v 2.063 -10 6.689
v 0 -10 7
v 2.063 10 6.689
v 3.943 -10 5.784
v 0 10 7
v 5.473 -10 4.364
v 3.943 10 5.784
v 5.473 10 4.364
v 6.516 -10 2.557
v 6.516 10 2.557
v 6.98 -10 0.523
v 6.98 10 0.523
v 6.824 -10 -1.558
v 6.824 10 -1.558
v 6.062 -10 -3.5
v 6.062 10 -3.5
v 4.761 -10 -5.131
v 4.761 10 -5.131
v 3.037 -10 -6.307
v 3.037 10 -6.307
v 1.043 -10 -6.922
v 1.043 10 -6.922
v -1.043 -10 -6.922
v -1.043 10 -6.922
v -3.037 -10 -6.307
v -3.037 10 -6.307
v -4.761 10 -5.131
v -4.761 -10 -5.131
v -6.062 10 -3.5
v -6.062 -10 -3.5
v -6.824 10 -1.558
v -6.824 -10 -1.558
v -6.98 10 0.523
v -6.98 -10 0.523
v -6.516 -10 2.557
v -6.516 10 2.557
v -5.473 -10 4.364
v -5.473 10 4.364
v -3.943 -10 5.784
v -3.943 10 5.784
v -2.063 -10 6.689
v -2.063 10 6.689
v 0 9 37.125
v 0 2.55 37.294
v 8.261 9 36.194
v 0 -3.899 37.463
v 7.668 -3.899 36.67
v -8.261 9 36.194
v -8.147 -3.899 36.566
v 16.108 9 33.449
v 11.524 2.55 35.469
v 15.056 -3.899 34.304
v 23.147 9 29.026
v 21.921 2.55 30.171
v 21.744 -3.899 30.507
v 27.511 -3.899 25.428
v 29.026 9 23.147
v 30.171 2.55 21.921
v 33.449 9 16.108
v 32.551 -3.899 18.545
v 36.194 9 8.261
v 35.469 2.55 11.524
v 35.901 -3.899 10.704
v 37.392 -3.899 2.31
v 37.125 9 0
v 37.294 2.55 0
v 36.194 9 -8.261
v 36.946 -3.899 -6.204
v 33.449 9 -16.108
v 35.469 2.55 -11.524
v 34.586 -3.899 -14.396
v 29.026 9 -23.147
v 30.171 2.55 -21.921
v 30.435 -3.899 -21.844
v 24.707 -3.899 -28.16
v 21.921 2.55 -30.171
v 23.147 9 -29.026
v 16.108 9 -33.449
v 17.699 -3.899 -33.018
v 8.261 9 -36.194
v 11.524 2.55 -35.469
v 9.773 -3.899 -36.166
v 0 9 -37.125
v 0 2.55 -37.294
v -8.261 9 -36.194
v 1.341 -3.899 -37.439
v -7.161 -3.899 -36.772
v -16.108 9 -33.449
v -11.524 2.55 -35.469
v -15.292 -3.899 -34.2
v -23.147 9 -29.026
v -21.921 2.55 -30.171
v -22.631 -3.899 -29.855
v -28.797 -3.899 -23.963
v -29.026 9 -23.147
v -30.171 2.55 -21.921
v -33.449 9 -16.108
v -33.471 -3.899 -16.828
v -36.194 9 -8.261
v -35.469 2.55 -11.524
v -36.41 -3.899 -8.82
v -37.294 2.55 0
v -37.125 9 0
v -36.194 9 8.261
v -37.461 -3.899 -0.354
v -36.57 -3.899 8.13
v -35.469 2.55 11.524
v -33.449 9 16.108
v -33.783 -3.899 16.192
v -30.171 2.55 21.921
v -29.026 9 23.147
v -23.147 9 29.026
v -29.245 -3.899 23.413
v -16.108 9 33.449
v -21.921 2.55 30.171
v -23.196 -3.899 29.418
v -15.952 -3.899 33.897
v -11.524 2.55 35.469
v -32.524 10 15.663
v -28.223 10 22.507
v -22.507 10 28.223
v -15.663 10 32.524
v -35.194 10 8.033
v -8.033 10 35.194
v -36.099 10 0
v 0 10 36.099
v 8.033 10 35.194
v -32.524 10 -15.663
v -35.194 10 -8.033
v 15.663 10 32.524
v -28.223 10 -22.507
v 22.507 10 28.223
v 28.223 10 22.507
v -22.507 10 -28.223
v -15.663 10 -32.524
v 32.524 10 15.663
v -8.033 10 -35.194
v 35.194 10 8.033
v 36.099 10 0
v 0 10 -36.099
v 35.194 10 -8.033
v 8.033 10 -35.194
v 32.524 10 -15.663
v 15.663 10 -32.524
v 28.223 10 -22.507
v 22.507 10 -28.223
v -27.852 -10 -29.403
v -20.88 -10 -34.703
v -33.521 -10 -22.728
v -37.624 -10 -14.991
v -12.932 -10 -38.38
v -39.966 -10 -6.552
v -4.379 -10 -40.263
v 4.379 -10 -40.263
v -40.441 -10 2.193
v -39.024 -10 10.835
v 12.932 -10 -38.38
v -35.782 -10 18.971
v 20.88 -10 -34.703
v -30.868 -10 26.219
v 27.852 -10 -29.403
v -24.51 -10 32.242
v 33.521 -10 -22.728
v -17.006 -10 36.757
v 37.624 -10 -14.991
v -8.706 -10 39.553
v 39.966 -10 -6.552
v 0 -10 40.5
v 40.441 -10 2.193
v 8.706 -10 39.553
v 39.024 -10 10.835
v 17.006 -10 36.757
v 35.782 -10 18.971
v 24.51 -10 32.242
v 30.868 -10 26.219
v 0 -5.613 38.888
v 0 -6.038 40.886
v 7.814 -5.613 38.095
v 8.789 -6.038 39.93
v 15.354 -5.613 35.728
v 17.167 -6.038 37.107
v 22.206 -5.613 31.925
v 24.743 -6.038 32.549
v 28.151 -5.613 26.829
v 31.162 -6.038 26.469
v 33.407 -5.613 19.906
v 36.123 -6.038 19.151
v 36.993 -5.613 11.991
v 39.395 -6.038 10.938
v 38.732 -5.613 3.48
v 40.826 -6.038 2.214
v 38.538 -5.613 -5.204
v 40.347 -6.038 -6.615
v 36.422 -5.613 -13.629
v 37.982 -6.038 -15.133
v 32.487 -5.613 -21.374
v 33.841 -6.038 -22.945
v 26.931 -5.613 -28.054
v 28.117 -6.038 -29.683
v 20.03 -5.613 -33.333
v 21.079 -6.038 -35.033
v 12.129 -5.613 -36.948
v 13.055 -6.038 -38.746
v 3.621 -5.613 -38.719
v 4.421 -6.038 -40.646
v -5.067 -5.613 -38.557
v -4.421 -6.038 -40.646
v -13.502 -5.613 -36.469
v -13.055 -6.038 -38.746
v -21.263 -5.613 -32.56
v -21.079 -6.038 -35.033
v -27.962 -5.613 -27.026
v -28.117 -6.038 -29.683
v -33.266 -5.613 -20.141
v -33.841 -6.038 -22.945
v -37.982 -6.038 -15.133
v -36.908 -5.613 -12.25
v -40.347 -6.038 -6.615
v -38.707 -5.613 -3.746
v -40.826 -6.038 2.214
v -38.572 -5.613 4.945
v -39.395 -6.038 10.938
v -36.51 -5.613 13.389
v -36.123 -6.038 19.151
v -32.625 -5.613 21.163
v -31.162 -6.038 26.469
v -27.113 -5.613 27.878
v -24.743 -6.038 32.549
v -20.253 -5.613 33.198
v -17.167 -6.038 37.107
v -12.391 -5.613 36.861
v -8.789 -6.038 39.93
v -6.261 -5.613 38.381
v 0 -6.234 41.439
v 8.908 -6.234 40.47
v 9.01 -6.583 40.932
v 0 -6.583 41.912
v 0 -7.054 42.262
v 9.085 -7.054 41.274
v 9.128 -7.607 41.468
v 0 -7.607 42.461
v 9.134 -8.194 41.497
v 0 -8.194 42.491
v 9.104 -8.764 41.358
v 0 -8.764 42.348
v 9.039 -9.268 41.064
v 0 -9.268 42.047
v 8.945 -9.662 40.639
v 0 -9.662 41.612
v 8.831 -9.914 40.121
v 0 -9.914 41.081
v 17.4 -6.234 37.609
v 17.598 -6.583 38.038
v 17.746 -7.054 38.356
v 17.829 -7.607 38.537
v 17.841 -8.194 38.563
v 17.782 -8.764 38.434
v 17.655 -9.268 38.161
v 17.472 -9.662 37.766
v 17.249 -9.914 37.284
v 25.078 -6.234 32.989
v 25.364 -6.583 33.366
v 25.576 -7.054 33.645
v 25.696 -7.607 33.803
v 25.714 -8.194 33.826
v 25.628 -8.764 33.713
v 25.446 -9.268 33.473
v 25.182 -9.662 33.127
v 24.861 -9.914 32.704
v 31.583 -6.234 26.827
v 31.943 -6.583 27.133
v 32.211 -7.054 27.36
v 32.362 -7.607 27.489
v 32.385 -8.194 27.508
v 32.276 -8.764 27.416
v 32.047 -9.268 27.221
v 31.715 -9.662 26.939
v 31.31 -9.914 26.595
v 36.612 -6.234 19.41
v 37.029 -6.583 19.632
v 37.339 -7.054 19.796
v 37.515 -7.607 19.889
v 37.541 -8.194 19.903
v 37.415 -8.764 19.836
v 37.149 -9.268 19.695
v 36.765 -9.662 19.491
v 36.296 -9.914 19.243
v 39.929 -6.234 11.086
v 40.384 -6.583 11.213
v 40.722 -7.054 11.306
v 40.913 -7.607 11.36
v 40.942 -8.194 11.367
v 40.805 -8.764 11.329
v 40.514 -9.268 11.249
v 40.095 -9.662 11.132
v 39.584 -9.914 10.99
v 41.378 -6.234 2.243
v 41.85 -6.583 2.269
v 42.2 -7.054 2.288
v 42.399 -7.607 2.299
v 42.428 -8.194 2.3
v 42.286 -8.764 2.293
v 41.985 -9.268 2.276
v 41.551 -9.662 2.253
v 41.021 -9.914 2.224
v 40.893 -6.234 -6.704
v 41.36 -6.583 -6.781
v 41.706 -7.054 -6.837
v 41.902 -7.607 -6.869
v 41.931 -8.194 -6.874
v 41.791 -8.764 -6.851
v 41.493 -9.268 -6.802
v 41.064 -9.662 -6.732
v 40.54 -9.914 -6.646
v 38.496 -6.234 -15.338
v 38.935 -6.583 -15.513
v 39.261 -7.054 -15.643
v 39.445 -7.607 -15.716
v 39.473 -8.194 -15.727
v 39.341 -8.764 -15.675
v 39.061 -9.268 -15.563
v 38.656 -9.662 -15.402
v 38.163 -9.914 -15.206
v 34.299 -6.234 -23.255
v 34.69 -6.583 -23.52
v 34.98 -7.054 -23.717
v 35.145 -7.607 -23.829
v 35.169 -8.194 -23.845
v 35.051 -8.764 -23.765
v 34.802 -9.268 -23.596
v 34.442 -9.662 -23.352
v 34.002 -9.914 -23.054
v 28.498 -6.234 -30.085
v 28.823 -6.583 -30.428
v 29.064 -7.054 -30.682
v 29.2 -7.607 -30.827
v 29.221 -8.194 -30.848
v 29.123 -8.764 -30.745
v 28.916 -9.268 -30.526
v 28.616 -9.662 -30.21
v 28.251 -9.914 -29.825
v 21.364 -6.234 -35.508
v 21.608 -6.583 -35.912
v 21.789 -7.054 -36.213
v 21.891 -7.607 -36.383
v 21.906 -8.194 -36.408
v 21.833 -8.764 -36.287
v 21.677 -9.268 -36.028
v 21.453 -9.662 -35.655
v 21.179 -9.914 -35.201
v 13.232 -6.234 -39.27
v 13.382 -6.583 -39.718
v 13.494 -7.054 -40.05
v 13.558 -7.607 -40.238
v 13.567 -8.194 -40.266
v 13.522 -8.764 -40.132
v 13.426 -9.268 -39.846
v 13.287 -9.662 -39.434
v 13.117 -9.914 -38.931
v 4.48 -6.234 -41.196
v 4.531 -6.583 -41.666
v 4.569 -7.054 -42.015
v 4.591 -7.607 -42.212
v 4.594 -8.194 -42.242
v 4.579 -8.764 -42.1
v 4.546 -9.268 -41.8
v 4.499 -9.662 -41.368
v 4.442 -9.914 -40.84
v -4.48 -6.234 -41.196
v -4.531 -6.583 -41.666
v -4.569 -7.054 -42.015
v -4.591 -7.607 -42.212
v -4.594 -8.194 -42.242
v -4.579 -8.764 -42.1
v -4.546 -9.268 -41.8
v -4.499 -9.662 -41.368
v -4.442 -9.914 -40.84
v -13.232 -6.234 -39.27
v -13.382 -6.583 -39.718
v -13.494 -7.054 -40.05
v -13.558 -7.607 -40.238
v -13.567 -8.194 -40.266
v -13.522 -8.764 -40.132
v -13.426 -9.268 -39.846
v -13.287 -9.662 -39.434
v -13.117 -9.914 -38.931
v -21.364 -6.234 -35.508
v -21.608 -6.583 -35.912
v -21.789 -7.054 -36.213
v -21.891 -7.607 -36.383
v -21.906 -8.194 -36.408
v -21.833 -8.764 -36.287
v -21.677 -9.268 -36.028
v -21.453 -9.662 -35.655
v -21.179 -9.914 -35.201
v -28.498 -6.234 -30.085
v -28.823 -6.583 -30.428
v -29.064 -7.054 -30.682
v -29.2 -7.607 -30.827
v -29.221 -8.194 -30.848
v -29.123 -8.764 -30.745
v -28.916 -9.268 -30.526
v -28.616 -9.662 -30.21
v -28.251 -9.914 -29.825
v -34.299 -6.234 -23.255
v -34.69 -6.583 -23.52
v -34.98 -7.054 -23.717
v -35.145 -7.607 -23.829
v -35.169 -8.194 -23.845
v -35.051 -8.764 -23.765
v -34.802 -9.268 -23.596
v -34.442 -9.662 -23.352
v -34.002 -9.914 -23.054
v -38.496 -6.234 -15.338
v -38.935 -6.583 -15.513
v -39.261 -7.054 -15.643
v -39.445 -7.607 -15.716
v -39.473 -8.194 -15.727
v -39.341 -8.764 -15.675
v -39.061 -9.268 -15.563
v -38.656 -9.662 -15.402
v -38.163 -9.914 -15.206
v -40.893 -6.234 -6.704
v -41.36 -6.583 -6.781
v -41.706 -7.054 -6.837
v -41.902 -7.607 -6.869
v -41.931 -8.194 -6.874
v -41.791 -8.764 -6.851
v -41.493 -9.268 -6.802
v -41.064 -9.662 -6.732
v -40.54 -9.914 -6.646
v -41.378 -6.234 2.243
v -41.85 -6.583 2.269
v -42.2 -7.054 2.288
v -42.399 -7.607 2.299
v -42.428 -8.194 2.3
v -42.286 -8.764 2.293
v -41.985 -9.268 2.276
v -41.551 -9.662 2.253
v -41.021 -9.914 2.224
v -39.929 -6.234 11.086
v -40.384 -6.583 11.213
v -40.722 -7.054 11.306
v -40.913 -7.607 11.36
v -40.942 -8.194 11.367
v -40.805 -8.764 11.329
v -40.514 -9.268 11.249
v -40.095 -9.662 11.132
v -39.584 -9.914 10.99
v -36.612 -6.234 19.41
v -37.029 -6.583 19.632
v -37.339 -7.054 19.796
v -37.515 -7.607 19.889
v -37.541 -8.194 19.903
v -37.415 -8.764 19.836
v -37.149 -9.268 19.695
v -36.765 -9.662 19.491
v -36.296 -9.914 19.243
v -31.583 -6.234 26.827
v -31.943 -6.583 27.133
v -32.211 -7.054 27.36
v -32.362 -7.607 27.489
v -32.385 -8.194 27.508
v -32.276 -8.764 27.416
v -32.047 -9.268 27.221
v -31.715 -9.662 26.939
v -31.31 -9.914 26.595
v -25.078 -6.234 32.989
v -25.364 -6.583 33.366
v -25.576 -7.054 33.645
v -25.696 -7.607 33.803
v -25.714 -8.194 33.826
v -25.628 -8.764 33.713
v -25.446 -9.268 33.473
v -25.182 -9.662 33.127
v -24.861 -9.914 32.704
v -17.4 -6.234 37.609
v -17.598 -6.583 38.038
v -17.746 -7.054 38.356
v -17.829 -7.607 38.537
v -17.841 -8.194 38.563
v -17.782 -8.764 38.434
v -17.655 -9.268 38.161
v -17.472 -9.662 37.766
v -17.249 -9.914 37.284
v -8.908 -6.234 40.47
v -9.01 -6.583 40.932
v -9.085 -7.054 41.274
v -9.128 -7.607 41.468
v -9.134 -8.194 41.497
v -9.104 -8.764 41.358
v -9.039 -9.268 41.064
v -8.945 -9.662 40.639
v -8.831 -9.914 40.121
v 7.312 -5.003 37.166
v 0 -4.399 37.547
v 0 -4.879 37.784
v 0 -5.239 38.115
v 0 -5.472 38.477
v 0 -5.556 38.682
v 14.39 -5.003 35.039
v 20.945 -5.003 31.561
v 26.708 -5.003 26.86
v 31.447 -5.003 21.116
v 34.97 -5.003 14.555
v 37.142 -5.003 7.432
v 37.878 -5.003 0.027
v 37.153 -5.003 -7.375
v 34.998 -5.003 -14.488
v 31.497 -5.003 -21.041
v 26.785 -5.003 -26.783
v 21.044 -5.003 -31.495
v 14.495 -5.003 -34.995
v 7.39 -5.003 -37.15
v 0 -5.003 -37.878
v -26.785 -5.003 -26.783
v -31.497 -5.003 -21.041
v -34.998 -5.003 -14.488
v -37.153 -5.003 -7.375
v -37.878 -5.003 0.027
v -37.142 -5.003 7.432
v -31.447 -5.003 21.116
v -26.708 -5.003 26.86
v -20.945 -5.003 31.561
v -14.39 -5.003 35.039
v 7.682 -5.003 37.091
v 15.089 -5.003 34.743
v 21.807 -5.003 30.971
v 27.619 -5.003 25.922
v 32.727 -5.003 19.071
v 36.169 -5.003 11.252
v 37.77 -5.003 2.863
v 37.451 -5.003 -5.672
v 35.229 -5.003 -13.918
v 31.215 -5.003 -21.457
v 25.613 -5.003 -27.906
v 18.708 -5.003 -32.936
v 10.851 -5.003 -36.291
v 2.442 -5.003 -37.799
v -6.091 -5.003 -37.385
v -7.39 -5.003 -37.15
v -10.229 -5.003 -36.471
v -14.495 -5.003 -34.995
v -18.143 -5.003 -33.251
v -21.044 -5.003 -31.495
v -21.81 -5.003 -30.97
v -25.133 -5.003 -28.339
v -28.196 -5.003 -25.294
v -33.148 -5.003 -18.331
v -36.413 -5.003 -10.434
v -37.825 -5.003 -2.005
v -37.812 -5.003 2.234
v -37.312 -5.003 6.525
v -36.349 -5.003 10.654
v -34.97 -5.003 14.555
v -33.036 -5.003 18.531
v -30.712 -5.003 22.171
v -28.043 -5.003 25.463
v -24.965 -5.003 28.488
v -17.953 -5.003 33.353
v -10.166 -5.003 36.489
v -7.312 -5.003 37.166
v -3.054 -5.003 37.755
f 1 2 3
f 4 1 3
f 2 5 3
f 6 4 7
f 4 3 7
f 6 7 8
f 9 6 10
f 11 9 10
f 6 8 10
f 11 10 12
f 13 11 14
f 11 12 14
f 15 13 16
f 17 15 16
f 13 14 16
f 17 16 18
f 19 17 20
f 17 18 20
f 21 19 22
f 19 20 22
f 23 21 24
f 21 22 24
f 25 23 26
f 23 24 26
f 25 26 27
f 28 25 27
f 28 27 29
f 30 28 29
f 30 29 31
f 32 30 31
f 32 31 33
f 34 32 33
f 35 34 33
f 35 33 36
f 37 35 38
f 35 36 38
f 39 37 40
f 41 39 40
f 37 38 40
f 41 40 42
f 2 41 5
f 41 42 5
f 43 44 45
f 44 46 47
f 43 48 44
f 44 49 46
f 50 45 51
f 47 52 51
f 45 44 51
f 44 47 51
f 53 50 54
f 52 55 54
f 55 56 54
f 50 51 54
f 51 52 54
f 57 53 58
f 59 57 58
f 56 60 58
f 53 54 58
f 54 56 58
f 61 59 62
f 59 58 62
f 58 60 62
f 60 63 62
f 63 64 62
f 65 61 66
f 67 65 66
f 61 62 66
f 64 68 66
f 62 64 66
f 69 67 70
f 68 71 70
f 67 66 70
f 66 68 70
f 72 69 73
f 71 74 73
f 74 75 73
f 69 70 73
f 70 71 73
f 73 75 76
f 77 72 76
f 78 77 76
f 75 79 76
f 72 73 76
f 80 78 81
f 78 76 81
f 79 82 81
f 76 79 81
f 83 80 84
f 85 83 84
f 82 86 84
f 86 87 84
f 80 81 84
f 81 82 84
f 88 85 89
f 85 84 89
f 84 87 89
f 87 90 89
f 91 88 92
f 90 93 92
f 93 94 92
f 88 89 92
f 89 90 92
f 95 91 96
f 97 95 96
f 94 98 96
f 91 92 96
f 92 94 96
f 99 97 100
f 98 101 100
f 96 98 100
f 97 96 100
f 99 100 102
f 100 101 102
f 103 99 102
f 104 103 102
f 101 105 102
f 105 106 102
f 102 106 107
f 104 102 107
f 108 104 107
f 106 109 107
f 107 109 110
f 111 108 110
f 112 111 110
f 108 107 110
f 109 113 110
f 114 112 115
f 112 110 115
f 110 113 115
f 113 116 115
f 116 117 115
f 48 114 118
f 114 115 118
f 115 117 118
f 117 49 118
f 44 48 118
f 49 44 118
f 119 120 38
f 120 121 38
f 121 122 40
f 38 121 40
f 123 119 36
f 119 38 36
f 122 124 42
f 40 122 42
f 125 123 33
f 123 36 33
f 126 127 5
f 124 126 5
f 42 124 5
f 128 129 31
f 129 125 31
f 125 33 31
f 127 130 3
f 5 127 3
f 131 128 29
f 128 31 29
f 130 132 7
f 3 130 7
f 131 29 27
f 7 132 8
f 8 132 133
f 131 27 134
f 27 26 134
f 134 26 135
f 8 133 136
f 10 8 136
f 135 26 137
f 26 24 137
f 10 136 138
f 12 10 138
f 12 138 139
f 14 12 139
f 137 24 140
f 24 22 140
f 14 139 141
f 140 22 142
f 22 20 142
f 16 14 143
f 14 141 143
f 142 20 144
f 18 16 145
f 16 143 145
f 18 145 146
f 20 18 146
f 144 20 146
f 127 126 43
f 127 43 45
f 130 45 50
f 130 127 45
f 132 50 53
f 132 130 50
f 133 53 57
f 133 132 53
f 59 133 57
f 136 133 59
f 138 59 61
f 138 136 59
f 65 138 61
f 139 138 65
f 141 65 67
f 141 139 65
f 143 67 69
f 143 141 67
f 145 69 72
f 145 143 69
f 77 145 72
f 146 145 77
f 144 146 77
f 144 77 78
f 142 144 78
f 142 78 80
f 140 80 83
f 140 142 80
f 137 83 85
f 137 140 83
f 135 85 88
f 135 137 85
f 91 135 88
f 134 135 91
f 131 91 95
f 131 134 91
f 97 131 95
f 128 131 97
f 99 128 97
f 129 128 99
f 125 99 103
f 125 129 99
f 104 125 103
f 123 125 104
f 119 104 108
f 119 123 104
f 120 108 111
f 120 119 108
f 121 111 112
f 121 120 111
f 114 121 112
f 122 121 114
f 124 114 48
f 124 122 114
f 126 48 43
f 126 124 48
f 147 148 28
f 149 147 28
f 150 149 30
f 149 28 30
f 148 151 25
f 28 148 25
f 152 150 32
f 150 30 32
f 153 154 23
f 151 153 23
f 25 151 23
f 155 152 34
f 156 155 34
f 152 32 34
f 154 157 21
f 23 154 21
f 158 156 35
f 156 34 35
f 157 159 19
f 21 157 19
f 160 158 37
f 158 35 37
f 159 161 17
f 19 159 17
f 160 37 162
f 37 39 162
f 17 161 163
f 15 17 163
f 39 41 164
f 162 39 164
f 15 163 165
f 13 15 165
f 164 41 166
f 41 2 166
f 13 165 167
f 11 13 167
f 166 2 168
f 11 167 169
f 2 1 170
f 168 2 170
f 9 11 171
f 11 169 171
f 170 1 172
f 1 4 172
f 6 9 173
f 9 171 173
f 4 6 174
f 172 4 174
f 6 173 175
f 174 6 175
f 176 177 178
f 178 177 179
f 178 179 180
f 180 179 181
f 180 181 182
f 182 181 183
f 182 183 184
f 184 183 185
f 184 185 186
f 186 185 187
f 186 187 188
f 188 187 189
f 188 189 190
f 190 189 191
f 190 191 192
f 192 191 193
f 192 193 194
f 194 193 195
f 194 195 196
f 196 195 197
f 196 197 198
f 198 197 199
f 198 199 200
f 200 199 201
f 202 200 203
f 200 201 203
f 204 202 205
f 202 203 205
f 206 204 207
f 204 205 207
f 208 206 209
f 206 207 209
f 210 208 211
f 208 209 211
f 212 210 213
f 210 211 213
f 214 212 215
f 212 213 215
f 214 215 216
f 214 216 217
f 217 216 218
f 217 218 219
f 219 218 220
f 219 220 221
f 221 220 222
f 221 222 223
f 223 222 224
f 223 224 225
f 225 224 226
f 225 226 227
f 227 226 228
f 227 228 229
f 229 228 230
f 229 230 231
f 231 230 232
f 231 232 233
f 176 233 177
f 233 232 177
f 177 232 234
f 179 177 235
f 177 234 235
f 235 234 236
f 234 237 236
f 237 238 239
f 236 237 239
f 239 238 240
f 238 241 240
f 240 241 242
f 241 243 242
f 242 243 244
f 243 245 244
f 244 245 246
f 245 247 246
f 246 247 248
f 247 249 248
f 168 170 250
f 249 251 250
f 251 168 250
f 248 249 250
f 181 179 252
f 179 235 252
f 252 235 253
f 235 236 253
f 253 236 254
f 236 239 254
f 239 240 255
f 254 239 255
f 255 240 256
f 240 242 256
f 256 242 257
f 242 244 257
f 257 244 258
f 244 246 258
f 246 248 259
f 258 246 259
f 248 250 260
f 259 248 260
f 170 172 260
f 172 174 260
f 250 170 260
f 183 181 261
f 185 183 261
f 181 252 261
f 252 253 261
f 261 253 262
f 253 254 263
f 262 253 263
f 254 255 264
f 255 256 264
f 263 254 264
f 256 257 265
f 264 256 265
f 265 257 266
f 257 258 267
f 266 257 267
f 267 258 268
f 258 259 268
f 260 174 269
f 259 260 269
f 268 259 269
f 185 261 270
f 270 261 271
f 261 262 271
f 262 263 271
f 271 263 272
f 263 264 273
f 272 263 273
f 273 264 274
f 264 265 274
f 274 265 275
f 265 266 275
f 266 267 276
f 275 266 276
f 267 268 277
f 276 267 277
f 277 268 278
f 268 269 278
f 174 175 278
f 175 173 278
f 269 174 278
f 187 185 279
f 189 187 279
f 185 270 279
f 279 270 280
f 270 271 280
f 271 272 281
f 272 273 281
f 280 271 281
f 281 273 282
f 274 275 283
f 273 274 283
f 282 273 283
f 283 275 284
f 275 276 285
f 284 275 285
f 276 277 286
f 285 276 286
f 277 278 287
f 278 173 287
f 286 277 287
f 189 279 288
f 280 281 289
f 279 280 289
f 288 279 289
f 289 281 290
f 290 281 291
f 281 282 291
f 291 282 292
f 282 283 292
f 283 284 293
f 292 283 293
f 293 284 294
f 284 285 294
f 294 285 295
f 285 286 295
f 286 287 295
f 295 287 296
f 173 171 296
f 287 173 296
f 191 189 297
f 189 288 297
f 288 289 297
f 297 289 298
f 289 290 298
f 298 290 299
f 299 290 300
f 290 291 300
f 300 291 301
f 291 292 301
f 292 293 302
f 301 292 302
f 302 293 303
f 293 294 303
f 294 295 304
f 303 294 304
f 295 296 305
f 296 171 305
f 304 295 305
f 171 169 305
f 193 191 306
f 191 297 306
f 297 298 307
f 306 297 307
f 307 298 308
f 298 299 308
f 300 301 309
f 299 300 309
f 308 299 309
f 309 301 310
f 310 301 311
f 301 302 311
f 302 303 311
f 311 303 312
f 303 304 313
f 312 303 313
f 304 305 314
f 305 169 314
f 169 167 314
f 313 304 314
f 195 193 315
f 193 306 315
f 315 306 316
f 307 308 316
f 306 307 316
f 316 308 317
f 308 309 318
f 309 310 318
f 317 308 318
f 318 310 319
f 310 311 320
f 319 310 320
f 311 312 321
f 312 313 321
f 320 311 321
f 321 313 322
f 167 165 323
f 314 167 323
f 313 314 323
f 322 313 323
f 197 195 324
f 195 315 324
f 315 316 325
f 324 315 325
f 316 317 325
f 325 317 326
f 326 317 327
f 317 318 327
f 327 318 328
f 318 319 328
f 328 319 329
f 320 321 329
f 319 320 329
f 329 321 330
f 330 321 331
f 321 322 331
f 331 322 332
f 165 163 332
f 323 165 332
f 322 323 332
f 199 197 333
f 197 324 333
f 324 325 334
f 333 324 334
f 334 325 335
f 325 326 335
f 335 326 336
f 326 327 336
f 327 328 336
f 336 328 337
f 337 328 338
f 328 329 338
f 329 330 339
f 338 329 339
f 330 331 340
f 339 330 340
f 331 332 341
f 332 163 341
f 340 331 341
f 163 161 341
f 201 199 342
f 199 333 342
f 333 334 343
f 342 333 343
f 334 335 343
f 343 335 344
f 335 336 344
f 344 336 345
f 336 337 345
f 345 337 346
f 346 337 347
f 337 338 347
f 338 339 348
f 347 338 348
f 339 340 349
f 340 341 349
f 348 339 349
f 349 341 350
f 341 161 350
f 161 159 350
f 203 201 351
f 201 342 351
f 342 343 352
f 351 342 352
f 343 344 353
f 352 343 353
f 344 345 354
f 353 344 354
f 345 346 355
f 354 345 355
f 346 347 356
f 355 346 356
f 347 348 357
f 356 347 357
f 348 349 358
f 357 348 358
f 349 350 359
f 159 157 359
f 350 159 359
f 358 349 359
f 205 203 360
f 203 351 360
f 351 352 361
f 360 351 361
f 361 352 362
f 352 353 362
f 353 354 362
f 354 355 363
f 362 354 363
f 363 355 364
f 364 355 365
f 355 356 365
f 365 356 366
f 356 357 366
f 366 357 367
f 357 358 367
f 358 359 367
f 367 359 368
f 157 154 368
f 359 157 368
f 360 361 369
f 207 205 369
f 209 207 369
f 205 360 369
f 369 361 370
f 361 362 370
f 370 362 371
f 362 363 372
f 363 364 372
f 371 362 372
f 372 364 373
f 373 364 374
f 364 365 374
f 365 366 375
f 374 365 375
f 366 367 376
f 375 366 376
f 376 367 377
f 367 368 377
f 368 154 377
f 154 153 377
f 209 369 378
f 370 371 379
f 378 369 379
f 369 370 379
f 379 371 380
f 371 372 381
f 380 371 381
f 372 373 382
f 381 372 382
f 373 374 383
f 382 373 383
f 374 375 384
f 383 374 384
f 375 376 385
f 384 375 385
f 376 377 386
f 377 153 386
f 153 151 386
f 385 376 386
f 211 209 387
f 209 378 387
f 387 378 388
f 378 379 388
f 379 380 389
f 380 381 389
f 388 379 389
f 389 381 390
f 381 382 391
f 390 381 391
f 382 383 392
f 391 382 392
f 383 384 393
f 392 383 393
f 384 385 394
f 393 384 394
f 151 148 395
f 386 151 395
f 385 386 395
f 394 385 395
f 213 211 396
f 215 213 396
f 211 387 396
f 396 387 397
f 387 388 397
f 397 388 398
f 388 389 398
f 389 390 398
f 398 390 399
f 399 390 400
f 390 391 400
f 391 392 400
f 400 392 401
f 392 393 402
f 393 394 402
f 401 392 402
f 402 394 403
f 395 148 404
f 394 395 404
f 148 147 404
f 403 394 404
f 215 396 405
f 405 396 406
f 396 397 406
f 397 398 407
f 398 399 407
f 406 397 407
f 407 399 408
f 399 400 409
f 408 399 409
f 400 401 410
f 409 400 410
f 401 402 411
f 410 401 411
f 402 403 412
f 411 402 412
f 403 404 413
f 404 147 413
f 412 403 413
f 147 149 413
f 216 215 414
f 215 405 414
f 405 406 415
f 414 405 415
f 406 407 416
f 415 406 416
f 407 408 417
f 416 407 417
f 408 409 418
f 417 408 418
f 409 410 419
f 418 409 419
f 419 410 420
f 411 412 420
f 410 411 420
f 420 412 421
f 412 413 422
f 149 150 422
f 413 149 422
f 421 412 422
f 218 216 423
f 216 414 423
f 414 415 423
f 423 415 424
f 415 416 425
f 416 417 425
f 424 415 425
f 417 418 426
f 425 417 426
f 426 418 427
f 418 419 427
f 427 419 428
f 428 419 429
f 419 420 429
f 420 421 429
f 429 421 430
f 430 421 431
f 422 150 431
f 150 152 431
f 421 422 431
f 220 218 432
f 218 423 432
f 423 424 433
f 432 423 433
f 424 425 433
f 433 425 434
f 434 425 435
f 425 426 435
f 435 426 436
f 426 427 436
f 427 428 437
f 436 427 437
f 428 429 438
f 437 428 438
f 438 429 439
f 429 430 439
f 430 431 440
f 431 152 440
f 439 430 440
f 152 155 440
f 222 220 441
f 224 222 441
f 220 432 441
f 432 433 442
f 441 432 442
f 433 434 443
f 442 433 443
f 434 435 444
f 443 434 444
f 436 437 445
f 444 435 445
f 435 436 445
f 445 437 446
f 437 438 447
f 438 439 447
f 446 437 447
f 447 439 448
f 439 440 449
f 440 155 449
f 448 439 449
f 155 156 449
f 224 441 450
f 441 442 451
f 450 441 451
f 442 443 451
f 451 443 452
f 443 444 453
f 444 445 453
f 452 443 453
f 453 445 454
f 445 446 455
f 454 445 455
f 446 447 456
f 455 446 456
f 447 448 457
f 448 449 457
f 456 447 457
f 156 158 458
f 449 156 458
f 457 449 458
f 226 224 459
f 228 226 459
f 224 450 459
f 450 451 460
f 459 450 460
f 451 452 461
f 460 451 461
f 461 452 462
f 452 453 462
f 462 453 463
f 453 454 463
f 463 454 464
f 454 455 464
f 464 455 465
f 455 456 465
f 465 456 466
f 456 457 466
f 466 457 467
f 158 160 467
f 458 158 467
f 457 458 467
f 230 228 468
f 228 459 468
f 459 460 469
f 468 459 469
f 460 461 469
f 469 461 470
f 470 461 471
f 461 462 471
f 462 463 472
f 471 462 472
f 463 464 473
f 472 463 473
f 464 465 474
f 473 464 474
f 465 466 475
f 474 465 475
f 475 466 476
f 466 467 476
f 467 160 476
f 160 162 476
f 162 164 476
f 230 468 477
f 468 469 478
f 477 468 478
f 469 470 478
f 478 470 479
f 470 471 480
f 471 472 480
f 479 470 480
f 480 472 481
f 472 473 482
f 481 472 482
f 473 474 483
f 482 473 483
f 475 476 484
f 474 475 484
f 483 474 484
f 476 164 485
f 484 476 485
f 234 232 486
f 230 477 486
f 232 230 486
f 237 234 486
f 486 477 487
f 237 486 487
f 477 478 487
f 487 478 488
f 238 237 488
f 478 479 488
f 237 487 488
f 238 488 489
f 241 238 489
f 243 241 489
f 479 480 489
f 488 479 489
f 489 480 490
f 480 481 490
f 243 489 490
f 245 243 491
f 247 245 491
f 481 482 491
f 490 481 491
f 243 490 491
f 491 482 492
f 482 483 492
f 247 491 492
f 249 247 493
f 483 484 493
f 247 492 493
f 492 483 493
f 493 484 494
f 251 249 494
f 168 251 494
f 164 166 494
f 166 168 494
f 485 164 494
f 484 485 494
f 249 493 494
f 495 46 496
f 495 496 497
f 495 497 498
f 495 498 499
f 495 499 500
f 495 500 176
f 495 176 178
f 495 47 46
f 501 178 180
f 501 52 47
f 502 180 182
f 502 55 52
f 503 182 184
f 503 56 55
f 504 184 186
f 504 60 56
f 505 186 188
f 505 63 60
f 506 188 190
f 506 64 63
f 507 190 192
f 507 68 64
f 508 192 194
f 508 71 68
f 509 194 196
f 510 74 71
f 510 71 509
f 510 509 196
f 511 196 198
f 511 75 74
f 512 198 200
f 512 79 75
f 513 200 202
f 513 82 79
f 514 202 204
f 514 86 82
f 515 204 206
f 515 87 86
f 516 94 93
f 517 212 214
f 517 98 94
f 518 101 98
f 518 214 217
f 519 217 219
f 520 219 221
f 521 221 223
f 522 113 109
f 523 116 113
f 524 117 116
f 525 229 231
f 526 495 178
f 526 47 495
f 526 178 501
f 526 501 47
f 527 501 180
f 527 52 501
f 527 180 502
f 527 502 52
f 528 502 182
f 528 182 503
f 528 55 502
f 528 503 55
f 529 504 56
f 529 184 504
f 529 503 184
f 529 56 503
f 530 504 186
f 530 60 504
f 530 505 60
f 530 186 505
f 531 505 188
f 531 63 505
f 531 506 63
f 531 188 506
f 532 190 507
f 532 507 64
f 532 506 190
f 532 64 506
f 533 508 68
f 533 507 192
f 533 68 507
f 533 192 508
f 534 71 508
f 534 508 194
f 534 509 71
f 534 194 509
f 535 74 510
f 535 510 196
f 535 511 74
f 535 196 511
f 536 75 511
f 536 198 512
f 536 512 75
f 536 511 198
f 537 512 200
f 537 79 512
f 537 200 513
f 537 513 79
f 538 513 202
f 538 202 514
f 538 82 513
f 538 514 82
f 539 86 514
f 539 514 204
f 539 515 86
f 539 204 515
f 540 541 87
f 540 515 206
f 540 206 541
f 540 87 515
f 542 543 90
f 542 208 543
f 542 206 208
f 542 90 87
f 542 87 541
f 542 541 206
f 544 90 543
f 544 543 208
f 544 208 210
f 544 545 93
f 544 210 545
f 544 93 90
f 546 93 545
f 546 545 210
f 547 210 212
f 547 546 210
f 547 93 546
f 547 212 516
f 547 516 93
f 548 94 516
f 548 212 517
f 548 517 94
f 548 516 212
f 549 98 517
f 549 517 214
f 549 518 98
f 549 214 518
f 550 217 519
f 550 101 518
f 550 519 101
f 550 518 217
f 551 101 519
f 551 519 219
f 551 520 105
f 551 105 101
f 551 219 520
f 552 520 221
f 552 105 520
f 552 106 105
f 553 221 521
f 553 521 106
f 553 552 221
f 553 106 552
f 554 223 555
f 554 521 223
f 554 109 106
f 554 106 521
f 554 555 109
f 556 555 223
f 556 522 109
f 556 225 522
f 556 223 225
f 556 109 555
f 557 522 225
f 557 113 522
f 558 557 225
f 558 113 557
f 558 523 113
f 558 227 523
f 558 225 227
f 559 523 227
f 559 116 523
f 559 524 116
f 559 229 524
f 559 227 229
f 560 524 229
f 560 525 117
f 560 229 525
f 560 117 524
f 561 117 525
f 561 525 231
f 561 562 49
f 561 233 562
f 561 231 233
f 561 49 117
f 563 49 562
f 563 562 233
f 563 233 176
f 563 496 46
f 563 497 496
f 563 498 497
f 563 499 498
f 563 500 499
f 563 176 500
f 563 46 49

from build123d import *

# Parameters (mm, degrees)
F2_R    = 1.8
F3_SIZE = 1


with BuildPart() as f1:
    # F0 (on Right) → F1 (revolve)
    with BuildSketch(Plane.YZ):
        with BuildLine():
            Line((-10, 40.5), (-10, 7))
            Line((-10, 7), (10, 7))
            Line((10, 7), (10, 37.098887))
            Line((10, 37.098887), (-5.317889, 37.5))
            Line((-5.317889, 37.5), (-6.03756, 40.885786))
            ThreePointArc((-6.03756, 40.885786), (-8.193805, 42.490588), (-10, 40.5))
        make_face()
    revolve(axis=Axis((0, -1.591644, 0), (0, 1, 0)))

    # F2
    f2_edges = [f1.edges().sort_by_distance(p)[0] for p in [
        (0, -5.317889, -37.5),
    ]]
    fillet(f2_edges, radius=F2_R)

    # F3
    f3_edges = [f1.edges().sort_by_distance(p)[0] for p in [
        (0, 10, -37.098887),
    ]]
    chamfer(f3_edges, length=F3_SIZE)


solid = f1.part
